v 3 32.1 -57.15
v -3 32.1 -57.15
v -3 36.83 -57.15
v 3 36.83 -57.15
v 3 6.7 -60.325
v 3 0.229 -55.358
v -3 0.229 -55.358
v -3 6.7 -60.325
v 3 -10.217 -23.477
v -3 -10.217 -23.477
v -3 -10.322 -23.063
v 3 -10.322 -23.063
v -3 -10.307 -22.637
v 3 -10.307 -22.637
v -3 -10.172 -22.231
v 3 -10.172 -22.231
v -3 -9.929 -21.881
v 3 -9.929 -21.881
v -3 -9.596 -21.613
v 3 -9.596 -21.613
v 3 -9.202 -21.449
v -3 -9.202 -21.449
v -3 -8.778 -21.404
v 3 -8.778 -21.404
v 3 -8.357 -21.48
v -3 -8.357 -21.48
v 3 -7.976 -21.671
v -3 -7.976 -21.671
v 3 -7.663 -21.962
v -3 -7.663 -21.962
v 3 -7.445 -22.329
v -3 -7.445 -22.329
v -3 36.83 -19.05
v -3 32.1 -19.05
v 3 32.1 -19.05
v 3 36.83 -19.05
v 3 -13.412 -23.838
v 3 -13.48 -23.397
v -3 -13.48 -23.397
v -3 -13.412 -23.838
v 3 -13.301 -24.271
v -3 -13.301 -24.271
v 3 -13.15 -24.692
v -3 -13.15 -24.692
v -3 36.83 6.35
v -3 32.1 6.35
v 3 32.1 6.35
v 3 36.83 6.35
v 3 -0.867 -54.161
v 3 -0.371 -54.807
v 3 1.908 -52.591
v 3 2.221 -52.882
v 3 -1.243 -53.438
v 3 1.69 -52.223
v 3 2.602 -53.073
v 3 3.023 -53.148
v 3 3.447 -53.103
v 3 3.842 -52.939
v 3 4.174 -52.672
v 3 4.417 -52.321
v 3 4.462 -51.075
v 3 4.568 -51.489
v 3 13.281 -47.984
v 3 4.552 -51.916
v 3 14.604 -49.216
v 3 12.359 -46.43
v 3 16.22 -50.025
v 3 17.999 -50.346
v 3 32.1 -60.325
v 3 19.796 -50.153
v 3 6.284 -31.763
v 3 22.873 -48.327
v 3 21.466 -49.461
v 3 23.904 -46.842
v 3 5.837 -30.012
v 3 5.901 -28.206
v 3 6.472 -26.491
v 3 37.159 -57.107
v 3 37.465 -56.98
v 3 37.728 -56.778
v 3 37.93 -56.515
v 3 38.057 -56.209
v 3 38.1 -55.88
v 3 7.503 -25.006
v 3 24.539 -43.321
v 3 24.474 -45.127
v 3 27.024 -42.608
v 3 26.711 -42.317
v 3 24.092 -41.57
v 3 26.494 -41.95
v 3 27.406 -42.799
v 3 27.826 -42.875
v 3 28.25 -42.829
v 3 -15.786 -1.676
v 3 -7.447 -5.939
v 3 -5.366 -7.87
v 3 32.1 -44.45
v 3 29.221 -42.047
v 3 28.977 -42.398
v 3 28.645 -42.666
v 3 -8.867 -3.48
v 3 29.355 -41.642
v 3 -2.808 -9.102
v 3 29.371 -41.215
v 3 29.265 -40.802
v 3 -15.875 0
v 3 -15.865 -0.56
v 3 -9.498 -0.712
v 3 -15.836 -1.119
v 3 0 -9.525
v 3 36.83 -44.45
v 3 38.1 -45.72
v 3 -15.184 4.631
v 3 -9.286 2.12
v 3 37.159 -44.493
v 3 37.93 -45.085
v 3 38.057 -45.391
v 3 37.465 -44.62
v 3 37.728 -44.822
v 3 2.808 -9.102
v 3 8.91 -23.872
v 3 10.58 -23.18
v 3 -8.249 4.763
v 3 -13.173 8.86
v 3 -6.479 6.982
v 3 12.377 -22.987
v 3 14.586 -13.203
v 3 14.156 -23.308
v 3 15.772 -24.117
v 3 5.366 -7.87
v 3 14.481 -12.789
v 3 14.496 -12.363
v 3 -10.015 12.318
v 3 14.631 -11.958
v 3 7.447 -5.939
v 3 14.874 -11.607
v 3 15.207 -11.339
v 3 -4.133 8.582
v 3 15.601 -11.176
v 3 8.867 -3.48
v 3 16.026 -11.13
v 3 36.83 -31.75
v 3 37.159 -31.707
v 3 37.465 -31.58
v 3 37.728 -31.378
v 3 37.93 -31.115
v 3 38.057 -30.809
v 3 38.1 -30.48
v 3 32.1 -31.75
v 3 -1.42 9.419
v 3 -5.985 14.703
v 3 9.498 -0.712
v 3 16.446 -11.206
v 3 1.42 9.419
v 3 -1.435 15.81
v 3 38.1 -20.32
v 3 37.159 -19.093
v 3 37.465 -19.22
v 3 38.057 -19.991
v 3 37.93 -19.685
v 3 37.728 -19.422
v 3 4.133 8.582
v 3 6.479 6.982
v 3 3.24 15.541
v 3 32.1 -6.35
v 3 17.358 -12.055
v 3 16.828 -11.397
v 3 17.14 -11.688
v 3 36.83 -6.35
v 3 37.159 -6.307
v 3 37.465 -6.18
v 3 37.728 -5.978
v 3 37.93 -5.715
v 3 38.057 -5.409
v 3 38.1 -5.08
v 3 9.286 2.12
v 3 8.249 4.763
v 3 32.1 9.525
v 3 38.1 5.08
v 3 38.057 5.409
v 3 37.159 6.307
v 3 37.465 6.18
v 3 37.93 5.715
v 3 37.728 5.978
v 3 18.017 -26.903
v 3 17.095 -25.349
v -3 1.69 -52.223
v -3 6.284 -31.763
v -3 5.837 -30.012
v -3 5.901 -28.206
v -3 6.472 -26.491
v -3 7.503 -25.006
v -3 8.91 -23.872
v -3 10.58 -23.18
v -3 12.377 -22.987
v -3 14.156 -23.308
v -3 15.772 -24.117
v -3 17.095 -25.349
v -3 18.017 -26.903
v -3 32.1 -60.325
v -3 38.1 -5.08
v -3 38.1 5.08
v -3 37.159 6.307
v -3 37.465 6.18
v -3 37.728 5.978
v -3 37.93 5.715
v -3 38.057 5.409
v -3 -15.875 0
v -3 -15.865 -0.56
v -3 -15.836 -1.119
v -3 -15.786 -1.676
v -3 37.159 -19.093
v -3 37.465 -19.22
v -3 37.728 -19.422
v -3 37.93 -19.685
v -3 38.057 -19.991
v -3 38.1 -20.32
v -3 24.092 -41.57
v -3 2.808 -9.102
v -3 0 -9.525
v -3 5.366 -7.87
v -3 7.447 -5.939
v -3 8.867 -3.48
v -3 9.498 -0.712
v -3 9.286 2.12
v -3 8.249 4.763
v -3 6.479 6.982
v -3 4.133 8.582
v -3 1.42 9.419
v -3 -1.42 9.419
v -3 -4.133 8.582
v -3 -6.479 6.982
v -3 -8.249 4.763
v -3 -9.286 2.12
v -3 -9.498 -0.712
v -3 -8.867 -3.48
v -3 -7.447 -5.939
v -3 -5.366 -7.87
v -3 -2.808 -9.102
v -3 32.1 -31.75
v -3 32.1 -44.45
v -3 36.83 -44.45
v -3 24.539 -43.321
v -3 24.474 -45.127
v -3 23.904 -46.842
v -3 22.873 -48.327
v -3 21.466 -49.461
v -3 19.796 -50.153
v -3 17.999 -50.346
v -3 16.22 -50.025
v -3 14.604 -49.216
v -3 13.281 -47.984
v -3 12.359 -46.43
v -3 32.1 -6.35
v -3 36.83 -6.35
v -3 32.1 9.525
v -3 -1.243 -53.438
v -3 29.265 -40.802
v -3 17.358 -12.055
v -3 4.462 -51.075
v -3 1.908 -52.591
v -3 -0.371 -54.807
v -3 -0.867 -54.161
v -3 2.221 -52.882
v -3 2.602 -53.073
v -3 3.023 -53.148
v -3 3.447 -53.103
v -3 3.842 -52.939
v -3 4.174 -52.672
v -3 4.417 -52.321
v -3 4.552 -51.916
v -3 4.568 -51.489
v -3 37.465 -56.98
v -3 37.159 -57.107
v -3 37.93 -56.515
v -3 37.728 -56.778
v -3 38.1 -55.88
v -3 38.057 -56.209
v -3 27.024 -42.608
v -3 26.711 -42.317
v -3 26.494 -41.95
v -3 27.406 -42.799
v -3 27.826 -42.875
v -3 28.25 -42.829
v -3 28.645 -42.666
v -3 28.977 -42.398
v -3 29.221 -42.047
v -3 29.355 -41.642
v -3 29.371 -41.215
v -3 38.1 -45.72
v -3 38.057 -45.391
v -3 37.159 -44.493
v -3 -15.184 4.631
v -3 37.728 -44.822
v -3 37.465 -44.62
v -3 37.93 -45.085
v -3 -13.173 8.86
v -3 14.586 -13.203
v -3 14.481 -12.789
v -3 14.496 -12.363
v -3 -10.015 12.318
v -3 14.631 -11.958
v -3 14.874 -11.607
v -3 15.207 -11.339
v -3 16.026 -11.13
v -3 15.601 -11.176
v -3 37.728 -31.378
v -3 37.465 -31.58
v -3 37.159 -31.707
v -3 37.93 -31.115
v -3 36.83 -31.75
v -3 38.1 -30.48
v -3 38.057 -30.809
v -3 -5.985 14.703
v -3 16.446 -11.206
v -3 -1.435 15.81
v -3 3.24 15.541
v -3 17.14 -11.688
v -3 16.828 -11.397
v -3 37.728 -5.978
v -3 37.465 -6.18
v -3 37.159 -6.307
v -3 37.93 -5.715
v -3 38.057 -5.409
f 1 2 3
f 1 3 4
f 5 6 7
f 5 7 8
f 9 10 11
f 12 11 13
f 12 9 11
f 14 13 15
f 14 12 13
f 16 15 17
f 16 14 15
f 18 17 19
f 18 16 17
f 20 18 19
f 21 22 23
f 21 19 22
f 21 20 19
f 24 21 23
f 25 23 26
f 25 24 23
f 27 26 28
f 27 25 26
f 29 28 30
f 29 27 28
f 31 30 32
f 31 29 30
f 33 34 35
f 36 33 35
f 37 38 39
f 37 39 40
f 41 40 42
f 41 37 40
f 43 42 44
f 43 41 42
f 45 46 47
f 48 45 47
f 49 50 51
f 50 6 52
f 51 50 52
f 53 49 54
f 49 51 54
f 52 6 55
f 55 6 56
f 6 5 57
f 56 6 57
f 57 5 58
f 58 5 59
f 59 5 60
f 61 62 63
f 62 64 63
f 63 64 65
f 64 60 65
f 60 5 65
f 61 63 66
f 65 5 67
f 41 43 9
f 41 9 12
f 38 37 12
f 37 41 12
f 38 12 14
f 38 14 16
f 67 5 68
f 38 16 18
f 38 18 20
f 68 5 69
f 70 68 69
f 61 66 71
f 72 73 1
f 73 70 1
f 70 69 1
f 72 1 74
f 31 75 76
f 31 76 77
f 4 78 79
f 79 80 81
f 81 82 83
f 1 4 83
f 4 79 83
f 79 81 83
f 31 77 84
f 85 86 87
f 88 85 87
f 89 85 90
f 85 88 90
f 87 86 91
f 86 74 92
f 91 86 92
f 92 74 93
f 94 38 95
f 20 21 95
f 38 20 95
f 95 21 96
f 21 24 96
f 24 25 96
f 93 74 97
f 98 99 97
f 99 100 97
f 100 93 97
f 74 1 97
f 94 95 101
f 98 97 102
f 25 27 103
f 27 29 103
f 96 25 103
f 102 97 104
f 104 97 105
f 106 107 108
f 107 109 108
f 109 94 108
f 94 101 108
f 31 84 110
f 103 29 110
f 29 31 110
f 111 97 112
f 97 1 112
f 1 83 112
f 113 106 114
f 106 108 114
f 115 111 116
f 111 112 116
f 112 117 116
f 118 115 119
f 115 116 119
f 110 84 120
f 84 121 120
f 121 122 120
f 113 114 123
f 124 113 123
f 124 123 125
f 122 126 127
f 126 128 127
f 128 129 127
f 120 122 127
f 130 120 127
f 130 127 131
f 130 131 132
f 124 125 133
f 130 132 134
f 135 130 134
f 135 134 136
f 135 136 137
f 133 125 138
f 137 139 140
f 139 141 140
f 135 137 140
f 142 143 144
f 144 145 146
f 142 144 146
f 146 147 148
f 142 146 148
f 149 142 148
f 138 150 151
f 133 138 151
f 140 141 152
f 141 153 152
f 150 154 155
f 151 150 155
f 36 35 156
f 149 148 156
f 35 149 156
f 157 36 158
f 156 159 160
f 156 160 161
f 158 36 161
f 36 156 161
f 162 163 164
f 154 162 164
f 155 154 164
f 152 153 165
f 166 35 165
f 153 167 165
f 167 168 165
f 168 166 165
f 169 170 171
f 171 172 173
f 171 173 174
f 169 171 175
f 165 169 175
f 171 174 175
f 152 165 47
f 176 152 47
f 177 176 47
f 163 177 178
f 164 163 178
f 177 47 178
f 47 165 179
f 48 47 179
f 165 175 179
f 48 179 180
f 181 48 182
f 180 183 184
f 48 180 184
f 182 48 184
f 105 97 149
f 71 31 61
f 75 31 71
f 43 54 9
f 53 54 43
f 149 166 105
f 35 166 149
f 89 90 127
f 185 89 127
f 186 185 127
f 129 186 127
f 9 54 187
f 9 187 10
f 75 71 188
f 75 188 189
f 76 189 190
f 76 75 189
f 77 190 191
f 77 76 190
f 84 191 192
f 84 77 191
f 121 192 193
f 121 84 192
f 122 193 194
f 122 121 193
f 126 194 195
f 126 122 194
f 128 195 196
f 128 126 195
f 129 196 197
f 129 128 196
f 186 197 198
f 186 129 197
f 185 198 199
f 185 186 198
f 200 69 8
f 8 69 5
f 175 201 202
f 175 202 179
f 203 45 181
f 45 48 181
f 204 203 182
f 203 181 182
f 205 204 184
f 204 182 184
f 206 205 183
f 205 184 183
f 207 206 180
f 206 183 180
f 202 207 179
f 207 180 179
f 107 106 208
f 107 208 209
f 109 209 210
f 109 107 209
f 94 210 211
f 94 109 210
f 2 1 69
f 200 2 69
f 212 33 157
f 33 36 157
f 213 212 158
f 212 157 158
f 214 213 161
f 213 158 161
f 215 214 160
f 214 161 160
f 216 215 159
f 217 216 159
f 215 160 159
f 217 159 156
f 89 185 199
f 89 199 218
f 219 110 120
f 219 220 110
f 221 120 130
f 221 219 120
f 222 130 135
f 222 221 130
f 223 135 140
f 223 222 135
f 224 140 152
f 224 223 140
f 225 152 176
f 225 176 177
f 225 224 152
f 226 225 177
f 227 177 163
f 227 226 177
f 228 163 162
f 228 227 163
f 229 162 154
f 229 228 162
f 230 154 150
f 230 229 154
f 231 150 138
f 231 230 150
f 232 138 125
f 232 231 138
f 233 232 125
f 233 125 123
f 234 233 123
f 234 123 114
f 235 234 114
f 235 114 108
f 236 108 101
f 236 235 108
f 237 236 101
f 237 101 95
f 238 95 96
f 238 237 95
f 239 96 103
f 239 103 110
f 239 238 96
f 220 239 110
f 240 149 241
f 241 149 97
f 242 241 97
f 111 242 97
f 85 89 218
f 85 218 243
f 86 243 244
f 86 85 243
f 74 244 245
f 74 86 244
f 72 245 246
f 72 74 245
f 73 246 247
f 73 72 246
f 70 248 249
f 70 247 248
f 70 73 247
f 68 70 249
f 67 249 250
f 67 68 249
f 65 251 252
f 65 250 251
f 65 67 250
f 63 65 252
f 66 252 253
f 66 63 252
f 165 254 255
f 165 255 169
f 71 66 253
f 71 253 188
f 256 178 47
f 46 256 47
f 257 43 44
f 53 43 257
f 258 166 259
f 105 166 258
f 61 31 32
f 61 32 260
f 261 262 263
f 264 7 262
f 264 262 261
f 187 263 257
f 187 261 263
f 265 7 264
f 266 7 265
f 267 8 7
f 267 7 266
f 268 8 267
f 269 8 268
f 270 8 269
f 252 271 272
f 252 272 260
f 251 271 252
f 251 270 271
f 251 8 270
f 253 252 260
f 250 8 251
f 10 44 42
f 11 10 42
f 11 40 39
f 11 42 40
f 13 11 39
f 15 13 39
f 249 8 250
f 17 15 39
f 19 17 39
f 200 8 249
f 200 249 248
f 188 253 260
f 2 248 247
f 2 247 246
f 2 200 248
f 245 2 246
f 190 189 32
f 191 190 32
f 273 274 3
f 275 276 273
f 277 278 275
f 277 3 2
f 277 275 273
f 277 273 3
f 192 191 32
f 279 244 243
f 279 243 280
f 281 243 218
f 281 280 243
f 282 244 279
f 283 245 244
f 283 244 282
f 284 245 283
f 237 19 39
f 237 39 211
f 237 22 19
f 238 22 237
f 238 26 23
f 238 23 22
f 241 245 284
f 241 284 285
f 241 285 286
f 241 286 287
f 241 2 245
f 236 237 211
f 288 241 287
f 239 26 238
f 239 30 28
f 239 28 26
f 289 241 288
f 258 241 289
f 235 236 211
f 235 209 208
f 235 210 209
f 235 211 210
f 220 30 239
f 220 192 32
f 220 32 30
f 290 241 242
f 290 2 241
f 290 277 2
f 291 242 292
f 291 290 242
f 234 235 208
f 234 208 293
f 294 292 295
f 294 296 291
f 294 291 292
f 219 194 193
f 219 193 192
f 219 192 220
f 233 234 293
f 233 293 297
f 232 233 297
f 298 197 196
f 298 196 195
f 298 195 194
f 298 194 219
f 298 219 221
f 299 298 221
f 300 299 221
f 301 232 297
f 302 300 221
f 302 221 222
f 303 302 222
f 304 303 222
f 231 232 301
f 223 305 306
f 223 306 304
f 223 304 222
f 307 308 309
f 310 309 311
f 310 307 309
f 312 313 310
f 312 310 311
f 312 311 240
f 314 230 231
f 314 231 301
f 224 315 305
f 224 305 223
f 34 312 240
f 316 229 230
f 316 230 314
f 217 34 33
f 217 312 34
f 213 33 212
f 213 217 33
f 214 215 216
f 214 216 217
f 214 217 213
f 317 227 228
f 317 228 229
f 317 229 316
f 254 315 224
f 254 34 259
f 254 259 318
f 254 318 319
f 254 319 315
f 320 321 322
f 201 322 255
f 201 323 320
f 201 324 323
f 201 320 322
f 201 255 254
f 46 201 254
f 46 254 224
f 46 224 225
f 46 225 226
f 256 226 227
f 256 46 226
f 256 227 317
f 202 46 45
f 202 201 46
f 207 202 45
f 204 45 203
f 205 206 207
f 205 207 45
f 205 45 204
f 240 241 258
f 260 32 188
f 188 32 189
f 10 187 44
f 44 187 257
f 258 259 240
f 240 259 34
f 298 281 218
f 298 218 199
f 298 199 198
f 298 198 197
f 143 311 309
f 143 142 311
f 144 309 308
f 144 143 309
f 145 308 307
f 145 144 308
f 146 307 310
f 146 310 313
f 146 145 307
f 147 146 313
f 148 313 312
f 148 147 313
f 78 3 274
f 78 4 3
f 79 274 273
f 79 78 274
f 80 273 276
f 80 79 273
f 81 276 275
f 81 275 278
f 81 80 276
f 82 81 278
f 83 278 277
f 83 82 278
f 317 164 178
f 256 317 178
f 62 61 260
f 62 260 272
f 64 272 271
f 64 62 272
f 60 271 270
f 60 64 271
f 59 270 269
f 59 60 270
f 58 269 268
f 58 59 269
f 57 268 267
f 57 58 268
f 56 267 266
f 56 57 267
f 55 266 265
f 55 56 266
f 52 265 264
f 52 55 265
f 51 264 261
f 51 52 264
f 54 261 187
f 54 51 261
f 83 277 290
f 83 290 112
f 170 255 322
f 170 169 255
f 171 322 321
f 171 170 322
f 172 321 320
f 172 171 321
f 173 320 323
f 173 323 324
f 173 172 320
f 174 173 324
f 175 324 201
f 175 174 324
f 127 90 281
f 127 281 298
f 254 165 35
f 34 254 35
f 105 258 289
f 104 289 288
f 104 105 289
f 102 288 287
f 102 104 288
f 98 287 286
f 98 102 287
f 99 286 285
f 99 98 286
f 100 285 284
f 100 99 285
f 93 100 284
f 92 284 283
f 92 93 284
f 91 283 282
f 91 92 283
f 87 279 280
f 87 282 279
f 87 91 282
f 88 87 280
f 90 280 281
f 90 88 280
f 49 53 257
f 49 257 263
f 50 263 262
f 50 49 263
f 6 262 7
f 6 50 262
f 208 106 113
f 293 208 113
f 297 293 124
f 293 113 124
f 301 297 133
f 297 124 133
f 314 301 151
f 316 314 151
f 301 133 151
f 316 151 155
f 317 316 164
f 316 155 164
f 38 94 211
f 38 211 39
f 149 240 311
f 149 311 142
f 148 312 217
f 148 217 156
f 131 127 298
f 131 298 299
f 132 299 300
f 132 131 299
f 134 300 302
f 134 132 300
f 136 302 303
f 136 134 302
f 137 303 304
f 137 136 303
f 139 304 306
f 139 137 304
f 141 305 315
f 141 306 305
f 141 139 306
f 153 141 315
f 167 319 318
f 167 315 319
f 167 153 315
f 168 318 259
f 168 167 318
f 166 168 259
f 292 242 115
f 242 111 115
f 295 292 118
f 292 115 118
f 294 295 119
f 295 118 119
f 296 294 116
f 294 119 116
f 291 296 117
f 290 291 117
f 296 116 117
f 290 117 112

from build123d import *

# Parameters (mm, degrees)
SKETCH1_R              = 9.525
BOSS_EXTRUDE1_DEPTH    = 3
CUT_EXTRUDE1_DEPTH     = 69.596761039
SKETCH3_W              = 6
SKETCH3_H              = 12.7
BOSS_EXTRUDE2_DEPTH    = 6
FILLET1_R              = 1.27
LPATTERN1_COUNT        = 3
LPATTERN1_PITCH        = 25.4
FILLET1_OF_LPATTERN1_R = 1.27


with BuildPart() as part:
    # Sketch1 → Boss-Extrude1 (new, symmetric)
    with BuildSketch(Plane(origin=(0, 0, 0), x_dir=(0, 0, -1), z_dir=(1, 0, 0))):
        with BuildLine():
            Line((-15.540953853, 3.23950279), (-9.525, 32.1))
            Line((-9.525, 32.1), (60.325, 32.1))
            Line((60.325, 32.1), (60.325, -15.875))
            Line((60.325, -15.875), (0, -15.875))
            ThreePointArc((0, -15.875), (-12.317522717, -10.014702148), (-15.540953853, 3.23950279))
        make_face()
        Circle(SKETCH1_R, mode=Mode.SUBTRACT)
    extrude(amount=BOSS_EXTRUDE1_DEPTH, both=True)

    # Sketch2 → Cut-Extrude1 (cut, through all)
    with BuildSketch(Plane(origin=(3, 0, 0), x_dir=(0, 0, -1), z_dir=(1, 0, 0))):
        with BuildLine():
            Line((1.676231888, -15.786255783), (23.396510982, -13.47993154))
            ThreePointArc((23.396510982, -13.47993154), (24.056064004, -13.361605673), (24.691925535, -13.150202478))
            Line((24.691925535, -13.150202478), (53.43843719, -1.24300748))
            ThreePointArc((53.43843719, -1.24300748), (54.494953994, -0.633102763), (55.357708418, 0.229374093))
            Line((55.357708418, 0.229374093), (60.325, 6.7))
            Line((60.325, 6.7), (60.325, -15.875))
            Line((60.325, -15.875), (0, -15.875))
            ThreePointArc((0, -15.875), (0.839289711, -15.852798421), (1.676231888, -15.786255783))
        make_face()
        with BuildLine():
            Line((26.903135362, 18.016834009), (41.56972294, 24.091933498))
            ThreePointArc((41.56972294, 24.091933498), (49.866397767, 20.655338262), (46.429802531, 12.358663435))
            Line((46.429802531, 12.358663435), (31.763214953, 6.283563946))
            ThreePointArc((31.763214953, 6.283563946), (23.466540126, 9.720159182), (26.903135362, 18.016834009))
        make_face()
        with BuildLine():
            Line((22.328855341, -7.445246365), (51.075366995, 4.461948633))
            ThreePointArc((51.075366995, 4.461948633), (53.035211442, 3.650154483), (52.223417292, 1.690310036))
            Line((52.223417292, 1.690310036), (23.476905638, -10.216884962))
            ThreePointArc((23.476905638, -10.216884962), (21.51706119, -9.405090812), (22.328855341, -7.445246365))
        make_face()
        with BuildLine():
            Line((12.055034553, 17.357951117), (40.801546208, 29.265146115))
            ThreePointArc((40.801546208, 29.265146115), (42.761390655, 28.453351965), (41.949596505, 26.493507518))
            Line((41.949596505, 26.493507518), (13.203084851, 14.58631252))
            ThreePointArc((13.203084851, 14.58631252), (11.243240403, 15.39810667), (12.055034553, 17.357951117))
        make_face()
    extrude(amount=-CUT_EXTRUDE1_DEPTH, mode=Mode.SUBTRACT)

    # Sketch3 → Boss-Extrude2 (add)
    with BuildSketch(Plane(origin=(0, 32.1, 0), x_dir=(1, 0, 0), z_dir=(0, 1, 0))):
        Rectangle(SKETCH3_W, SKETCH3_H)
    boss_extrude2 = extrude(amount=BOSS_EXTRUDE2_DEPTH)

    # Fillet1
    fillet1_edges = [part.edges().sort_by_distance(p)[0] for p in [
        (0, 38.1, -6.35),
        (0, 38.1, 6.35),
    ]]
    fillet(fillet1_edges, radius=FILLET1_R)

    # LPattern1: Boss-Extrude2 ×3
    with Locations(*[(0, 0, -i * LPATTERN1_PITCH) for i in range(1, LPATTERN1_COUNT)]):
        add(boss_extrude2)

    # Fillet1 of LPattern1
    fillet1_of_lpattern1_edges = [part.edges().sort_by_distance(p)[0] for p in [
        (0, 38.1, -31.75),
        (0, 38.1, -19.05),
        (0, 38.1, -57.15),
        (0, 38.1, -44.45),
    ]]
    fillet(fillet1_of_lpattern1_edges, radius=FILLET1_OF_LPATTERN1_R)


solid = part.part
